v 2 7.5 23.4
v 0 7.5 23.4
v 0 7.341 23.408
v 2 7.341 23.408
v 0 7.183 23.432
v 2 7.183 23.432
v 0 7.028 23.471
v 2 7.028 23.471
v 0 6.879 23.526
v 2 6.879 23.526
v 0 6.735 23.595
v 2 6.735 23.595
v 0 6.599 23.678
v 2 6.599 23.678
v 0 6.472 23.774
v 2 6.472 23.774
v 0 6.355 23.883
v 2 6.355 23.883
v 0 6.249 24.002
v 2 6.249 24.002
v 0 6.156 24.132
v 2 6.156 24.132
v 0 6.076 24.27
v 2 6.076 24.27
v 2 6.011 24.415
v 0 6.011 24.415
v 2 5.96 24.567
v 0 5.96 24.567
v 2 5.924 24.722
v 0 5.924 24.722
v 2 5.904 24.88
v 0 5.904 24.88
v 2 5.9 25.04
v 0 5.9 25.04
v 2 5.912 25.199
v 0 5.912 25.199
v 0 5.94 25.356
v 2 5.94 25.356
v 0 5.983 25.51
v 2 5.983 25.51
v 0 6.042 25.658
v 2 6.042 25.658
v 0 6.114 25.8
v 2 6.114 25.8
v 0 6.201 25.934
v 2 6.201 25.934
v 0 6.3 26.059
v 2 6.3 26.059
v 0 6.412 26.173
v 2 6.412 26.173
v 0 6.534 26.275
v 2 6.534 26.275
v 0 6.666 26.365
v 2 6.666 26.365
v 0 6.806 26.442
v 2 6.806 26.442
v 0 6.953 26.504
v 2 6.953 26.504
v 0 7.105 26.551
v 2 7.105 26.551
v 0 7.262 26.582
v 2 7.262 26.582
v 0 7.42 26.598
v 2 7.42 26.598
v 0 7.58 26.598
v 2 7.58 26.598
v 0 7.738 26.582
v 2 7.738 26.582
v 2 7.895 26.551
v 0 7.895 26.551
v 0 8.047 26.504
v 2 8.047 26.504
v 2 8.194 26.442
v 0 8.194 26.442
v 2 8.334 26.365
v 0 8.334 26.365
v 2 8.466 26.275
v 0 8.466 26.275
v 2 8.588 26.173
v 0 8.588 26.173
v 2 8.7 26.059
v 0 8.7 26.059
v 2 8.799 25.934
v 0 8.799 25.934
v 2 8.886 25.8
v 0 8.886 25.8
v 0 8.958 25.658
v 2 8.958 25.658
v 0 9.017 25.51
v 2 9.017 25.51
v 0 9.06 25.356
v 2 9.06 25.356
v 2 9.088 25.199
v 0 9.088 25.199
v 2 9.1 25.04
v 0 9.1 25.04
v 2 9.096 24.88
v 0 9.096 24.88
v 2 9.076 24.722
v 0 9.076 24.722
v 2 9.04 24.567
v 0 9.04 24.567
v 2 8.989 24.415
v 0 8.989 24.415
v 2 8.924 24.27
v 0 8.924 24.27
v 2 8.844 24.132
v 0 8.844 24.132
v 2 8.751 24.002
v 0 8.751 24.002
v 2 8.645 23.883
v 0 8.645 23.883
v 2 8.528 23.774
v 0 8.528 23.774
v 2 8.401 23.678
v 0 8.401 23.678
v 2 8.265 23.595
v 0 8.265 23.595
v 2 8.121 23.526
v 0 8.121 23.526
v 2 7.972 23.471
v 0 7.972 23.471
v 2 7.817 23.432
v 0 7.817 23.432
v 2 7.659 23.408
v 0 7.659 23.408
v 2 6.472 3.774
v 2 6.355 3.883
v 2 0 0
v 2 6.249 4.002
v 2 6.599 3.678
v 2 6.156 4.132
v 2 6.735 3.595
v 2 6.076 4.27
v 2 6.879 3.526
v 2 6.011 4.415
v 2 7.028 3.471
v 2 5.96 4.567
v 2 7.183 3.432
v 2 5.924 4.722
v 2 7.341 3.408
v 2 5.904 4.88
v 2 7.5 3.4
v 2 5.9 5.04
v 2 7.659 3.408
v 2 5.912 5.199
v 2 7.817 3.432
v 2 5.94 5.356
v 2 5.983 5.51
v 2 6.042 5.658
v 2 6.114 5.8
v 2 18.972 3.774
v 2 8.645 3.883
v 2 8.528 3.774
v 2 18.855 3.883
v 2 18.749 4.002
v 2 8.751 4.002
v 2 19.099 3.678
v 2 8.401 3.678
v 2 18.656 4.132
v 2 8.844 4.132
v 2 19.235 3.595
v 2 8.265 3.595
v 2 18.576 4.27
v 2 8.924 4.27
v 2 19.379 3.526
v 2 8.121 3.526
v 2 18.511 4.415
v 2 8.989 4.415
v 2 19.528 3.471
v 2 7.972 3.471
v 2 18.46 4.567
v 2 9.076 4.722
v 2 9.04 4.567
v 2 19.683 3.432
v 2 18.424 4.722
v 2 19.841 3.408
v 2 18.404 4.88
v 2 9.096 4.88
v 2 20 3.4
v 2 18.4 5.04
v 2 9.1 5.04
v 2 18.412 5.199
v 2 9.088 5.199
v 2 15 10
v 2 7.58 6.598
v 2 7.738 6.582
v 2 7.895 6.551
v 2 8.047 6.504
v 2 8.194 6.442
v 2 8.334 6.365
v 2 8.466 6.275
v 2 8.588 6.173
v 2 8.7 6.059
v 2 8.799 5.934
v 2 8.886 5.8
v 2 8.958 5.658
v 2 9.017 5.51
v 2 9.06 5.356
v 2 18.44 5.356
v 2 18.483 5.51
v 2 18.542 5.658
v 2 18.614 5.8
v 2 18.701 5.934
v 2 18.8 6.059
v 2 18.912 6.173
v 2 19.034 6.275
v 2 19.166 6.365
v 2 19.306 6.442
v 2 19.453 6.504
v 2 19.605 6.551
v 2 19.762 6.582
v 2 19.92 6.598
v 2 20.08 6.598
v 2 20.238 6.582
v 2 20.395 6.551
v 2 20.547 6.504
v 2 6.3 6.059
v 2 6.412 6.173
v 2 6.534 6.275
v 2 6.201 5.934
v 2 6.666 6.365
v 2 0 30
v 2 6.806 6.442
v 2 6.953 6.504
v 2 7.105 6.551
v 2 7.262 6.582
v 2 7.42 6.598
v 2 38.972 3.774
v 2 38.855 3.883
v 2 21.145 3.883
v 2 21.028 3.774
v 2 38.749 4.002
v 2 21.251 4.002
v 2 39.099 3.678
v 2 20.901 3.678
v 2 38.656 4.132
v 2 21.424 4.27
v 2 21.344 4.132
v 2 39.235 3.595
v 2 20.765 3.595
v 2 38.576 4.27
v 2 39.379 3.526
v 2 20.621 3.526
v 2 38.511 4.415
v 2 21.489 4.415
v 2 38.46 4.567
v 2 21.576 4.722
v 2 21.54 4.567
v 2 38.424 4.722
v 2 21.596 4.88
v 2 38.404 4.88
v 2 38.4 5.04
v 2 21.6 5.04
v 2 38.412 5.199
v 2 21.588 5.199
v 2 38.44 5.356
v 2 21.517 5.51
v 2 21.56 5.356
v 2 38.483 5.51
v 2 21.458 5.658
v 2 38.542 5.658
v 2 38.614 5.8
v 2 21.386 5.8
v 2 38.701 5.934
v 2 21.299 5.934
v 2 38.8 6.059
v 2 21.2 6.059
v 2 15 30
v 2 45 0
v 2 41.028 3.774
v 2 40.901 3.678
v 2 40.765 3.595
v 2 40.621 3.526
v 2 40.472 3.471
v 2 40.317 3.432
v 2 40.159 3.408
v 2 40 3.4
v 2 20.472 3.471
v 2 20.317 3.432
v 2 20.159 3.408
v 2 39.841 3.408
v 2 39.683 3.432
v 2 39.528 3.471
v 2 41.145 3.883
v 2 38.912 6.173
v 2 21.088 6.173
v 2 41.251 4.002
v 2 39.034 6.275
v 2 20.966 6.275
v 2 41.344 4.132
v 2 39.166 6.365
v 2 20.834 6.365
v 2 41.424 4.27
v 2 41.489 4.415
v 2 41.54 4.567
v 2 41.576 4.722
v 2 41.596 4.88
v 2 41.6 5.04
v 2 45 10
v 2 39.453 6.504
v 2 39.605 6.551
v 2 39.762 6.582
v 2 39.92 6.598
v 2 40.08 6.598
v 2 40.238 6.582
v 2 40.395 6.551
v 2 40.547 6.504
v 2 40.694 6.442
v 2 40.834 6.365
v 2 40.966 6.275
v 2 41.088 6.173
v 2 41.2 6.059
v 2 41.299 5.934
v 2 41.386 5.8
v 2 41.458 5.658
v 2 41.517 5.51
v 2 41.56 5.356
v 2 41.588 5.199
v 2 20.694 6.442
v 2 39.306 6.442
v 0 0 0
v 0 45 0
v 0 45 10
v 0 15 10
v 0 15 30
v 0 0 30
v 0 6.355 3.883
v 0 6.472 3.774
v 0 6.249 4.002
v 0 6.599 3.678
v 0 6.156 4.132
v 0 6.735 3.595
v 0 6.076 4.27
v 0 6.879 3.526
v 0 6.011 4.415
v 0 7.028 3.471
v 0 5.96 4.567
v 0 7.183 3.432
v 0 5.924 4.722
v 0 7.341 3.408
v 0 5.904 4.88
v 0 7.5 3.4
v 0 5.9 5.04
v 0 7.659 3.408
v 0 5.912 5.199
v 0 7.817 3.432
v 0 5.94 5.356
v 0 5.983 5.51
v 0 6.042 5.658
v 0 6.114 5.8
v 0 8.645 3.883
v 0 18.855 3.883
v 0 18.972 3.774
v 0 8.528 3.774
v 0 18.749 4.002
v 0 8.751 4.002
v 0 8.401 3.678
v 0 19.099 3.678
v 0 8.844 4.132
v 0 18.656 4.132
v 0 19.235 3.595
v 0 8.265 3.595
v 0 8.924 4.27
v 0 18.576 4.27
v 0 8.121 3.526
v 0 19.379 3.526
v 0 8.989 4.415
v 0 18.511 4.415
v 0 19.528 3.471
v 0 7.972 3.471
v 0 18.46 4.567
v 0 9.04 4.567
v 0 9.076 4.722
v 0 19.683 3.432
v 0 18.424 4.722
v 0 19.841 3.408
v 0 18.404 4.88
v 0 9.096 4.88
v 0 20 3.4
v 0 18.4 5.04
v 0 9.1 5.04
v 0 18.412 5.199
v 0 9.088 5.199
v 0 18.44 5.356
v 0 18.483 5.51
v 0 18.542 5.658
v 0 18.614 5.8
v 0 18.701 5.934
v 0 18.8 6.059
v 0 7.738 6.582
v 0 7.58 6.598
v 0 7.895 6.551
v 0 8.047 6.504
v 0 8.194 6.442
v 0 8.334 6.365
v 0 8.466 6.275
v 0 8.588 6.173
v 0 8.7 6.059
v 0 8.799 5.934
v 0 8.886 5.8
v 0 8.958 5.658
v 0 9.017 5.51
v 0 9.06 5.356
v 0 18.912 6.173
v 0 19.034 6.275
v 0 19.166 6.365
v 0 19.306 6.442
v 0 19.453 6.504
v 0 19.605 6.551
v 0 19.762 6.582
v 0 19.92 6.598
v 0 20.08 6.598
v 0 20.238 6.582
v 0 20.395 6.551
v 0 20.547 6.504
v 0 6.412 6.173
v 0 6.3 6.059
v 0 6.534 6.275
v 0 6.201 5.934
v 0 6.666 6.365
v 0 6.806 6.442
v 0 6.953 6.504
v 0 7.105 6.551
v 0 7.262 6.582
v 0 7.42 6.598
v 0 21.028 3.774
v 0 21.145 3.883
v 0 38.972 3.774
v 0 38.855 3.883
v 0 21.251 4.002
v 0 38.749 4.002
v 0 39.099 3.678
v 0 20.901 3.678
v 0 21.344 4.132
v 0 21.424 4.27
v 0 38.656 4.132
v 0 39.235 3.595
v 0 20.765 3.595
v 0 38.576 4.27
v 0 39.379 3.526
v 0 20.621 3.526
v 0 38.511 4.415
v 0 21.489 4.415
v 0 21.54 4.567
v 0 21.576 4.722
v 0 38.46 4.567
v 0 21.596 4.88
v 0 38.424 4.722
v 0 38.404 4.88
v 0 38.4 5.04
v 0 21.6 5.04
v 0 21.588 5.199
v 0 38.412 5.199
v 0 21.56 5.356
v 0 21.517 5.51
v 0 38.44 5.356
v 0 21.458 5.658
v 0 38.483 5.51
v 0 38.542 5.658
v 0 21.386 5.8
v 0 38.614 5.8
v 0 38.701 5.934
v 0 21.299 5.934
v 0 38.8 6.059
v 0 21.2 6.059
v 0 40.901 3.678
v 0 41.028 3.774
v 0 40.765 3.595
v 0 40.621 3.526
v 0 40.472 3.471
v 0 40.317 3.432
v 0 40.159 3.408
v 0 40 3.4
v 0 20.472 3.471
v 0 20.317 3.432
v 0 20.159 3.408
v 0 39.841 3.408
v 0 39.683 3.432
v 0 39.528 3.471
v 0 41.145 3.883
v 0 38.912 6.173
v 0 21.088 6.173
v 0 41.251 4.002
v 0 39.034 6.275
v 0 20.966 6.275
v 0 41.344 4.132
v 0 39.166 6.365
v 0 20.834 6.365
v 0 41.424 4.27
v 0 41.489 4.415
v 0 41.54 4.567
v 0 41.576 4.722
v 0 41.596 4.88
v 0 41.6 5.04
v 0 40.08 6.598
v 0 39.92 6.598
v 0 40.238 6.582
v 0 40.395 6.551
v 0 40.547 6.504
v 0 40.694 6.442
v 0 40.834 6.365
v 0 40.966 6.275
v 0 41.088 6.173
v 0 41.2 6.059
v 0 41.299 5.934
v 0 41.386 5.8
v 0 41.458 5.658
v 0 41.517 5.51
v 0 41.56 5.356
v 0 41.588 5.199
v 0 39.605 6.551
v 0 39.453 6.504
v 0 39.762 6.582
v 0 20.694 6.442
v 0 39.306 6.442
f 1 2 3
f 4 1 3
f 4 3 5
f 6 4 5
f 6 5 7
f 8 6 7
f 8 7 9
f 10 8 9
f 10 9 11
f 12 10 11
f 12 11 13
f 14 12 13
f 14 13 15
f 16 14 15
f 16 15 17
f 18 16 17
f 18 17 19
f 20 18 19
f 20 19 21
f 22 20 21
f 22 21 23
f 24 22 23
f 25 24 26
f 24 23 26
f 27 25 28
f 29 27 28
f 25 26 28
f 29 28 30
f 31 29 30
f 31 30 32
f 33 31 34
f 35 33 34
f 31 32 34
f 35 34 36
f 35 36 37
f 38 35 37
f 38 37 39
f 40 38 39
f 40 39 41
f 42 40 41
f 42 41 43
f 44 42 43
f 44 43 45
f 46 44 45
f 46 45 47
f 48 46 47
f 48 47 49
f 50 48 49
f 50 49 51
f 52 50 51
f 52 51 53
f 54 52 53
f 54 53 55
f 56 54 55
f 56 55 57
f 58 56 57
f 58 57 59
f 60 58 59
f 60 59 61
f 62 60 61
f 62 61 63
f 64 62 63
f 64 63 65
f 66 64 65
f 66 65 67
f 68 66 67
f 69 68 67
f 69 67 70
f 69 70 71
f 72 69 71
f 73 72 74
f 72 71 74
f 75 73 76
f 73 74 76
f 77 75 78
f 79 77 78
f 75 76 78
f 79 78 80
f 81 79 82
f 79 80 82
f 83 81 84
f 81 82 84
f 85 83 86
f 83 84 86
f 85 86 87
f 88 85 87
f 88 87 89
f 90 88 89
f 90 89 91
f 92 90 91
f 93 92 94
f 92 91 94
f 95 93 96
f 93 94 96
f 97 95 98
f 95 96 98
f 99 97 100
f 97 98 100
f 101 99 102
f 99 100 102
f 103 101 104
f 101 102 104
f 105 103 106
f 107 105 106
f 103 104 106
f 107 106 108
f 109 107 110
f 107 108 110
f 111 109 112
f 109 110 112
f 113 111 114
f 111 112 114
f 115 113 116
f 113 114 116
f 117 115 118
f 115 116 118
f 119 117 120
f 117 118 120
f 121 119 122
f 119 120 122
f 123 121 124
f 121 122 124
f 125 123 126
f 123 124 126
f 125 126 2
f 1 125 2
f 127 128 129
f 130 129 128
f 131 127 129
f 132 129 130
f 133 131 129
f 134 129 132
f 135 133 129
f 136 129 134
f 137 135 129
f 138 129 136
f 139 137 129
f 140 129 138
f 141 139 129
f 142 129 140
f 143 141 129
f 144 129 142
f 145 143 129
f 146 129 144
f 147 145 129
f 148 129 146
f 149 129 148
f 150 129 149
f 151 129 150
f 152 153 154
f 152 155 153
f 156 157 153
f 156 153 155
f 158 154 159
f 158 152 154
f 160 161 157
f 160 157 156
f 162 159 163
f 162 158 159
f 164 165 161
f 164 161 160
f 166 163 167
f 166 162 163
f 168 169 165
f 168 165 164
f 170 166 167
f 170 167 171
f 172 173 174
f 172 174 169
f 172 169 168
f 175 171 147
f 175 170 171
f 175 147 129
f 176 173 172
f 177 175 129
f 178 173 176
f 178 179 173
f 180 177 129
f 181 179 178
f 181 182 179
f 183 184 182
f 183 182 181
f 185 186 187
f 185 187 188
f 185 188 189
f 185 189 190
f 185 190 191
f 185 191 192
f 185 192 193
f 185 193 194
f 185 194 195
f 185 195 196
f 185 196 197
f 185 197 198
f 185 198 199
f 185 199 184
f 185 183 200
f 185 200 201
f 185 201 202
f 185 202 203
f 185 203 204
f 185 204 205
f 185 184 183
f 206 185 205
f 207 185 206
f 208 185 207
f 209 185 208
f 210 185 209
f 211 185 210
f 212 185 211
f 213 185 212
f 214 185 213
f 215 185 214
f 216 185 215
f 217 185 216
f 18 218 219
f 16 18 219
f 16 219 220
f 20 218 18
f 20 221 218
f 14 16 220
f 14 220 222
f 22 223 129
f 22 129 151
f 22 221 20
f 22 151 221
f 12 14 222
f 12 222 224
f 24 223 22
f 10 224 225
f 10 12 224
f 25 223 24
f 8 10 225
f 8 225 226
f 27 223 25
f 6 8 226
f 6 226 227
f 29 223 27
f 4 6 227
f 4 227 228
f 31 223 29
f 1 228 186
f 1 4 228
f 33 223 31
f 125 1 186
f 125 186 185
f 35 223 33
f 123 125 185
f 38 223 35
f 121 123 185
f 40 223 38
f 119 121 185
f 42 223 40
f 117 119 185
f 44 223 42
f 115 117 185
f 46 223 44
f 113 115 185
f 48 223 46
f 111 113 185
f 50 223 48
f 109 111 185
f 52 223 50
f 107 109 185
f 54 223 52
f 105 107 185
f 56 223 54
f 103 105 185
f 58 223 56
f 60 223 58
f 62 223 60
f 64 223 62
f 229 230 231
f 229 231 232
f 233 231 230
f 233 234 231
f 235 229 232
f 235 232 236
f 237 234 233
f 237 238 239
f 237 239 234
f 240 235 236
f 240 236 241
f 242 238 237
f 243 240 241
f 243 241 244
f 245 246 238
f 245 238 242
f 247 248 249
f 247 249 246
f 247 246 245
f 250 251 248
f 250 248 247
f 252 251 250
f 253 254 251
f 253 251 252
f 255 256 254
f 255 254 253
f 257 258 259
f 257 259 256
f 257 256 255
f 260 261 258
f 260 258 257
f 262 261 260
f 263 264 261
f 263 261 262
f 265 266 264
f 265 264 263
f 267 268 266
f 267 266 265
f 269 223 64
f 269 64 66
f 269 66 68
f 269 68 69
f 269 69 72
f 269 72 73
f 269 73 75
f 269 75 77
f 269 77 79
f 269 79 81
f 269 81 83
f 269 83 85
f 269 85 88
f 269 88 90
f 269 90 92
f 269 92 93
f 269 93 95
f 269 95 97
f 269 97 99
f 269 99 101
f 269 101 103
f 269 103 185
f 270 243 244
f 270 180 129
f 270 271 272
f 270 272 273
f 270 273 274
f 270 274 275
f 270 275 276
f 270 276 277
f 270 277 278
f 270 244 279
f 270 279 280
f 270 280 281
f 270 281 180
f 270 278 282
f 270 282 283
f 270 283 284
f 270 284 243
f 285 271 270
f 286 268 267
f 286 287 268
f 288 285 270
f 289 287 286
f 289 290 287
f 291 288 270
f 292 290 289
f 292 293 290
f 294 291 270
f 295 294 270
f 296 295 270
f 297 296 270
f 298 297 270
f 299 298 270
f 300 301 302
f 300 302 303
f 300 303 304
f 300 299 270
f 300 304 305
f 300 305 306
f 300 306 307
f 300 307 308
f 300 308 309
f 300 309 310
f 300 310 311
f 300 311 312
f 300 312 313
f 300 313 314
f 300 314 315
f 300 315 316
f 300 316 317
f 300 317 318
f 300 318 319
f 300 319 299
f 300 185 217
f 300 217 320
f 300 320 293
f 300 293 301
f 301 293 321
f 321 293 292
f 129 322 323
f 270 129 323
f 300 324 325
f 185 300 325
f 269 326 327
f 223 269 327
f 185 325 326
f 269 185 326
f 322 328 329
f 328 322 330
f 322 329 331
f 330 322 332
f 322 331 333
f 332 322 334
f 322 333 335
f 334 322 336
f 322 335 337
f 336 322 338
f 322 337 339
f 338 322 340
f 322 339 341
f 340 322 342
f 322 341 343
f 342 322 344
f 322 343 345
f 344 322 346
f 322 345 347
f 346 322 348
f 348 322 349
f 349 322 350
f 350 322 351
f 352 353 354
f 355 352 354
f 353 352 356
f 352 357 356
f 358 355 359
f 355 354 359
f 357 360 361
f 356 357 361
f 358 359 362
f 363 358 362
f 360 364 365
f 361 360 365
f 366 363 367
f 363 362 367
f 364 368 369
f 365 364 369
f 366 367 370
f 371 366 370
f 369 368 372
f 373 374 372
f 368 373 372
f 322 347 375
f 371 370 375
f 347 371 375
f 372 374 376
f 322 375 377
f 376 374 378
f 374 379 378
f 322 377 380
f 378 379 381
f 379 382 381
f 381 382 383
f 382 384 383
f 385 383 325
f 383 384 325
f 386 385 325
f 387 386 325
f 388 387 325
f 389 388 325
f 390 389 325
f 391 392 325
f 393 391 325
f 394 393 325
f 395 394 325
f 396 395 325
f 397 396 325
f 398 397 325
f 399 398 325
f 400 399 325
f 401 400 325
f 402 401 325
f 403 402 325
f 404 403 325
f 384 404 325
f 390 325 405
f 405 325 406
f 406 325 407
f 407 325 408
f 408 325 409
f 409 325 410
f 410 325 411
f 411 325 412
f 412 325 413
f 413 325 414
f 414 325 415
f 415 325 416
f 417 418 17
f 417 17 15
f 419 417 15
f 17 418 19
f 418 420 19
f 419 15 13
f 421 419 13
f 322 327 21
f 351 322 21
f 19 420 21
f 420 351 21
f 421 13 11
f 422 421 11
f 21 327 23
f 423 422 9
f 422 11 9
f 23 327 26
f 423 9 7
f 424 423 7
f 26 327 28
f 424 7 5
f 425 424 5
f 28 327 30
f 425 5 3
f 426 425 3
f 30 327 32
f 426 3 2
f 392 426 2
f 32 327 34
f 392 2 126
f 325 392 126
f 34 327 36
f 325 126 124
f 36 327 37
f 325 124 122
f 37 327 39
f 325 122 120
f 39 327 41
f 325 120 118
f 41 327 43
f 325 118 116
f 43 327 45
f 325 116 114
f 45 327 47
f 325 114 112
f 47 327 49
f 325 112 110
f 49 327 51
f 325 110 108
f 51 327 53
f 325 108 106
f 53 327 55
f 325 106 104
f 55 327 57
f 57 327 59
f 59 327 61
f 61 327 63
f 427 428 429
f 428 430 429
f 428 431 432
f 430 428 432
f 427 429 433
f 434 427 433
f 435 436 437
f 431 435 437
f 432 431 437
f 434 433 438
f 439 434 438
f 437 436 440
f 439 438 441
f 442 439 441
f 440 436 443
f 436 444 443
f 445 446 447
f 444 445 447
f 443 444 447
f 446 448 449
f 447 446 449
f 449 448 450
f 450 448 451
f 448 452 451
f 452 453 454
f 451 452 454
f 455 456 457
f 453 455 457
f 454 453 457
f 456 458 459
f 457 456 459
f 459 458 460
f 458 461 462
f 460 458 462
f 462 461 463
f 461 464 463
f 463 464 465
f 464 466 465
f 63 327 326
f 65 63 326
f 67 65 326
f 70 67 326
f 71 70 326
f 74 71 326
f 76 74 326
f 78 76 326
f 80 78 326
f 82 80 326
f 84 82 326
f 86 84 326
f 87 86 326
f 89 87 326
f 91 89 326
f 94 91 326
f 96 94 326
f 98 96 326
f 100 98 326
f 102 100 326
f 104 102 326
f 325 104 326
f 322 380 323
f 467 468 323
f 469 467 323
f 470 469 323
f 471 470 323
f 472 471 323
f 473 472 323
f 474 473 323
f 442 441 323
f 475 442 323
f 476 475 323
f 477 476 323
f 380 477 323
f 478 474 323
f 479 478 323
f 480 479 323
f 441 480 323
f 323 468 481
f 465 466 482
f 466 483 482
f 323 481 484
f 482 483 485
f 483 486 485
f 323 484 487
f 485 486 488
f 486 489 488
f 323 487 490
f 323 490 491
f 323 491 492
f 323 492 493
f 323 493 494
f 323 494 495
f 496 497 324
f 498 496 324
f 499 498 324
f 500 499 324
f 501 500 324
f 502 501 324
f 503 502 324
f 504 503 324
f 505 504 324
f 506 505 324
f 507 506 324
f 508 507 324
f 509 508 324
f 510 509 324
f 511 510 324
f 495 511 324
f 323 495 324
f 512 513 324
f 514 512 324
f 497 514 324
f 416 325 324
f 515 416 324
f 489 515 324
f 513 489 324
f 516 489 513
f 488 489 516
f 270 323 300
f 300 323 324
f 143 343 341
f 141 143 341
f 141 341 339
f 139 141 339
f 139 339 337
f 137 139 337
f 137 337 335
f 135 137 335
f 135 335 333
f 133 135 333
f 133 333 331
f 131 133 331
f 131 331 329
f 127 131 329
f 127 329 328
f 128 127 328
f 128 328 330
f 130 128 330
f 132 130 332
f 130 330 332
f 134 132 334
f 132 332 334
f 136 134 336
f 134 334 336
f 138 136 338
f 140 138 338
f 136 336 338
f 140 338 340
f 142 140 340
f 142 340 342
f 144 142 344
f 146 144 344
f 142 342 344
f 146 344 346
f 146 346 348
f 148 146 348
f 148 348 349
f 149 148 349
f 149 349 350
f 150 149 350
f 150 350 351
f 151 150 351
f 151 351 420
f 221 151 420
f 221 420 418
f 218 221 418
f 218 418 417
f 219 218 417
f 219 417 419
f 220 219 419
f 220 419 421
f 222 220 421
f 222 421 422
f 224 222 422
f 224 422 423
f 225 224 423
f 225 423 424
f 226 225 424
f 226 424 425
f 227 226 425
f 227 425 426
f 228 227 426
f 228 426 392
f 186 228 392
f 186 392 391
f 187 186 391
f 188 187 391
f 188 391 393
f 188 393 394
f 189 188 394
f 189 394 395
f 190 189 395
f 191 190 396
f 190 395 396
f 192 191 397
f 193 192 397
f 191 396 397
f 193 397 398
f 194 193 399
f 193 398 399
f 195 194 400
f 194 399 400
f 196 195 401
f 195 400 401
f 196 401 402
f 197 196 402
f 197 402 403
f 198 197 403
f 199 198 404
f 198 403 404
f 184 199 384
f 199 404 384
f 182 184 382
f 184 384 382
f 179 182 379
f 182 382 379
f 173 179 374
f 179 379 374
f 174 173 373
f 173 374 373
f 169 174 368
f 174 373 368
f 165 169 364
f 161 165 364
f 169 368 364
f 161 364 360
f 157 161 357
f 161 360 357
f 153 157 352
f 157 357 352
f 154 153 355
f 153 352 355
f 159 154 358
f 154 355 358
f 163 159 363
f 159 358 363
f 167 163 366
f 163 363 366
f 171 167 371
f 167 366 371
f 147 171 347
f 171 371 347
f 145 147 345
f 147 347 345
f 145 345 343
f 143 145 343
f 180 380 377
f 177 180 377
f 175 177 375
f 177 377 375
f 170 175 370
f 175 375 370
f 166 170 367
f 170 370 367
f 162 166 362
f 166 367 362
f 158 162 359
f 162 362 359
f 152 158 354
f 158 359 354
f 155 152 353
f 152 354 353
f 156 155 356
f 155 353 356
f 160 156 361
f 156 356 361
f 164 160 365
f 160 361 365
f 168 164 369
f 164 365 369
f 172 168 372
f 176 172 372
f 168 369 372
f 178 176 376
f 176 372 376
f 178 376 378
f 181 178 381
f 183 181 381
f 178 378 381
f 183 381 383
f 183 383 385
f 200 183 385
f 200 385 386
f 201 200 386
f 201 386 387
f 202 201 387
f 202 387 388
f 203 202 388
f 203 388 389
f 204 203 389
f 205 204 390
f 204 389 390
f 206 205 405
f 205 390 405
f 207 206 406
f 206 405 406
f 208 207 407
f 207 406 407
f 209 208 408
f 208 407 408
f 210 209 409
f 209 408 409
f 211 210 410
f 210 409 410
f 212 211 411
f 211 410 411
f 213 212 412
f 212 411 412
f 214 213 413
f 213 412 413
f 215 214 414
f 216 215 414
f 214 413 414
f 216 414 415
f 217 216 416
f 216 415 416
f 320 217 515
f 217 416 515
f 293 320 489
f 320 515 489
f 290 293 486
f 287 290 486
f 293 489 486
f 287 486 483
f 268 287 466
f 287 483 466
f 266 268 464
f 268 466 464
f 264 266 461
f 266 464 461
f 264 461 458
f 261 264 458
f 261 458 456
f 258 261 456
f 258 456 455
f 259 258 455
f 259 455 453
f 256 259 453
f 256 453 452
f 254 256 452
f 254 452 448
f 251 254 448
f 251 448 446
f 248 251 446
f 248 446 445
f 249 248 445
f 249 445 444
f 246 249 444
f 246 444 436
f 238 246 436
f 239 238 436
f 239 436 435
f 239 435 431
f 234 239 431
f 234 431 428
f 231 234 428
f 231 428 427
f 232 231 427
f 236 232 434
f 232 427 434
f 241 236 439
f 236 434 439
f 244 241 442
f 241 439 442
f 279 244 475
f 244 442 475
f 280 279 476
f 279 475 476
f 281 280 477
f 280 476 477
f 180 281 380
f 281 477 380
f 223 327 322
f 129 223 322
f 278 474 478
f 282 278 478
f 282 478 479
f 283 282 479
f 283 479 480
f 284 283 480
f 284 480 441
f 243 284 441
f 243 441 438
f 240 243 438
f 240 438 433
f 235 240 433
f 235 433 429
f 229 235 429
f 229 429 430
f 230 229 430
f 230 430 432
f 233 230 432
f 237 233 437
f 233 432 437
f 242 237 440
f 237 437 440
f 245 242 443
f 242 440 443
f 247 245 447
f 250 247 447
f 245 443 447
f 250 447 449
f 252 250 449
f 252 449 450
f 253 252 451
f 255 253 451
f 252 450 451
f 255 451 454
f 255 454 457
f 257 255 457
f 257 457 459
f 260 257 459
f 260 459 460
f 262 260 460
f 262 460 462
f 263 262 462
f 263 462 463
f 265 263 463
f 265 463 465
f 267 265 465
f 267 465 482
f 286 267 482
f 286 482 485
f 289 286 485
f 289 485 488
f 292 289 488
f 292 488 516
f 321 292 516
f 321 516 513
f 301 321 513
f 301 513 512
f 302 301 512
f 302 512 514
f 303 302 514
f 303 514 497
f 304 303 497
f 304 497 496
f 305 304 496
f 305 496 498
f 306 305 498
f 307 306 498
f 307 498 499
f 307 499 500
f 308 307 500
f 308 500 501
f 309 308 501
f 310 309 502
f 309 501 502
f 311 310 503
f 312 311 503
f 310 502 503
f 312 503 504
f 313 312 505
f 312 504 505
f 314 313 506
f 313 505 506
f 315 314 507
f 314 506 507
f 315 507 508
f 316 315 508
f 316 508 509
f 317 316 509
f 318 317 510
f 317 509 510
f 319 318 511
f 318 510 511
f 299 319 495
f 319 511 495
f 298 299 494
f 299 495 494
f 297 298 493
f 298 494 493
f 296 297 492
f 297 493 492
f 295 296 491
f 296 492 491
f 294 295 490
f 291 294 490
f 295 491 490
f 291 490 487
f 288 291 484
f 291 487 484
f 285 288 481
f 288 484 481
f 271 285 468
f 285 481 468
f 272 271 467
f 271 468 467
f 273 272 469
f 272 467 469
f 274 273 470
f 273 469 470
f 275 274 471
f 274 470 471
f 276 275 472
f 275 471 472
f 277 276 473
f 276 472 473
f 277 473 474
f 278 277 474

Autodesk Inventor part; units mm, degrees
ref_plane "YZ Plane" through (0, 0, 0) normal (1, 0, 0) x (0, 1, 0)
ref_plane "XZ Plane" through (0, 0, 0) normal (0, 1, 0) x (-1, 0, 0)
ref_plane "XY Plane" through (0, 0, 0) normal (0, 0, 1) x (1, 0, 0)
sketch "スケッチ1" plane through (0, 0, 0) normal (1, 0, 0) x (0, 1, 0)
  line L0 (0, 0) -> (45, 0)
  line L1 (45, 0) -> (45, 10)
  line L2 (45, 10) -> (0, 10)
  line L3 (0, 10) -> (0, 0)
  line L4 (0, 0) -> (15, 0)
  line L5 (15, 0) -> (15, 30)
  line L6 (15, 30) -> (0, 30)
  line L7 (0, 30) -> (0, 0)
  point P0 (0, 10)
  point P1 (15, 10)
  dimension "d0" = 10
  dimension "d1" = 15
  dimension "d2" = 30
  dimension "d3" = 30
extrude "押し出し1" add sketch "スケッチ1" along normal blind 2
sketch "スケッチ2" plane through (2, 0, 0) normal (1, 0, 0) x (0, 0, -1)
  line L0 (-30, 15) -> (-30, 0) projected
  line L1 (-30, 7.5) -> (0, 7.5) construction
  line L2 (0, 0) -> (0, 45) projected
  line L3 (0, 45) -> (-10, 45) projected
  line L4 (-5, 45) -> (-5, 0) construction
  line L5 (-30, 0) -> (0, 0) projected
  point P0 (-25, 7.5)
  point P1 (-5, 7.5)
  point P2 (-5, 20)
  point P3 (-5, 40)
  dimension "d6" = 20
  dimension "d7" = 5
  dimension "d8" = 20
  dimension "d9" = 5
hole "穴1" at (2, 7.5, 25) at (2, 7.5, 5) at (2, 20, 5) at (2, 40, 5) direction (-1, 0, 0) diameter 3.2 end through all
properties part number "FrameJointL1510" material "アルミニウム 6061"
